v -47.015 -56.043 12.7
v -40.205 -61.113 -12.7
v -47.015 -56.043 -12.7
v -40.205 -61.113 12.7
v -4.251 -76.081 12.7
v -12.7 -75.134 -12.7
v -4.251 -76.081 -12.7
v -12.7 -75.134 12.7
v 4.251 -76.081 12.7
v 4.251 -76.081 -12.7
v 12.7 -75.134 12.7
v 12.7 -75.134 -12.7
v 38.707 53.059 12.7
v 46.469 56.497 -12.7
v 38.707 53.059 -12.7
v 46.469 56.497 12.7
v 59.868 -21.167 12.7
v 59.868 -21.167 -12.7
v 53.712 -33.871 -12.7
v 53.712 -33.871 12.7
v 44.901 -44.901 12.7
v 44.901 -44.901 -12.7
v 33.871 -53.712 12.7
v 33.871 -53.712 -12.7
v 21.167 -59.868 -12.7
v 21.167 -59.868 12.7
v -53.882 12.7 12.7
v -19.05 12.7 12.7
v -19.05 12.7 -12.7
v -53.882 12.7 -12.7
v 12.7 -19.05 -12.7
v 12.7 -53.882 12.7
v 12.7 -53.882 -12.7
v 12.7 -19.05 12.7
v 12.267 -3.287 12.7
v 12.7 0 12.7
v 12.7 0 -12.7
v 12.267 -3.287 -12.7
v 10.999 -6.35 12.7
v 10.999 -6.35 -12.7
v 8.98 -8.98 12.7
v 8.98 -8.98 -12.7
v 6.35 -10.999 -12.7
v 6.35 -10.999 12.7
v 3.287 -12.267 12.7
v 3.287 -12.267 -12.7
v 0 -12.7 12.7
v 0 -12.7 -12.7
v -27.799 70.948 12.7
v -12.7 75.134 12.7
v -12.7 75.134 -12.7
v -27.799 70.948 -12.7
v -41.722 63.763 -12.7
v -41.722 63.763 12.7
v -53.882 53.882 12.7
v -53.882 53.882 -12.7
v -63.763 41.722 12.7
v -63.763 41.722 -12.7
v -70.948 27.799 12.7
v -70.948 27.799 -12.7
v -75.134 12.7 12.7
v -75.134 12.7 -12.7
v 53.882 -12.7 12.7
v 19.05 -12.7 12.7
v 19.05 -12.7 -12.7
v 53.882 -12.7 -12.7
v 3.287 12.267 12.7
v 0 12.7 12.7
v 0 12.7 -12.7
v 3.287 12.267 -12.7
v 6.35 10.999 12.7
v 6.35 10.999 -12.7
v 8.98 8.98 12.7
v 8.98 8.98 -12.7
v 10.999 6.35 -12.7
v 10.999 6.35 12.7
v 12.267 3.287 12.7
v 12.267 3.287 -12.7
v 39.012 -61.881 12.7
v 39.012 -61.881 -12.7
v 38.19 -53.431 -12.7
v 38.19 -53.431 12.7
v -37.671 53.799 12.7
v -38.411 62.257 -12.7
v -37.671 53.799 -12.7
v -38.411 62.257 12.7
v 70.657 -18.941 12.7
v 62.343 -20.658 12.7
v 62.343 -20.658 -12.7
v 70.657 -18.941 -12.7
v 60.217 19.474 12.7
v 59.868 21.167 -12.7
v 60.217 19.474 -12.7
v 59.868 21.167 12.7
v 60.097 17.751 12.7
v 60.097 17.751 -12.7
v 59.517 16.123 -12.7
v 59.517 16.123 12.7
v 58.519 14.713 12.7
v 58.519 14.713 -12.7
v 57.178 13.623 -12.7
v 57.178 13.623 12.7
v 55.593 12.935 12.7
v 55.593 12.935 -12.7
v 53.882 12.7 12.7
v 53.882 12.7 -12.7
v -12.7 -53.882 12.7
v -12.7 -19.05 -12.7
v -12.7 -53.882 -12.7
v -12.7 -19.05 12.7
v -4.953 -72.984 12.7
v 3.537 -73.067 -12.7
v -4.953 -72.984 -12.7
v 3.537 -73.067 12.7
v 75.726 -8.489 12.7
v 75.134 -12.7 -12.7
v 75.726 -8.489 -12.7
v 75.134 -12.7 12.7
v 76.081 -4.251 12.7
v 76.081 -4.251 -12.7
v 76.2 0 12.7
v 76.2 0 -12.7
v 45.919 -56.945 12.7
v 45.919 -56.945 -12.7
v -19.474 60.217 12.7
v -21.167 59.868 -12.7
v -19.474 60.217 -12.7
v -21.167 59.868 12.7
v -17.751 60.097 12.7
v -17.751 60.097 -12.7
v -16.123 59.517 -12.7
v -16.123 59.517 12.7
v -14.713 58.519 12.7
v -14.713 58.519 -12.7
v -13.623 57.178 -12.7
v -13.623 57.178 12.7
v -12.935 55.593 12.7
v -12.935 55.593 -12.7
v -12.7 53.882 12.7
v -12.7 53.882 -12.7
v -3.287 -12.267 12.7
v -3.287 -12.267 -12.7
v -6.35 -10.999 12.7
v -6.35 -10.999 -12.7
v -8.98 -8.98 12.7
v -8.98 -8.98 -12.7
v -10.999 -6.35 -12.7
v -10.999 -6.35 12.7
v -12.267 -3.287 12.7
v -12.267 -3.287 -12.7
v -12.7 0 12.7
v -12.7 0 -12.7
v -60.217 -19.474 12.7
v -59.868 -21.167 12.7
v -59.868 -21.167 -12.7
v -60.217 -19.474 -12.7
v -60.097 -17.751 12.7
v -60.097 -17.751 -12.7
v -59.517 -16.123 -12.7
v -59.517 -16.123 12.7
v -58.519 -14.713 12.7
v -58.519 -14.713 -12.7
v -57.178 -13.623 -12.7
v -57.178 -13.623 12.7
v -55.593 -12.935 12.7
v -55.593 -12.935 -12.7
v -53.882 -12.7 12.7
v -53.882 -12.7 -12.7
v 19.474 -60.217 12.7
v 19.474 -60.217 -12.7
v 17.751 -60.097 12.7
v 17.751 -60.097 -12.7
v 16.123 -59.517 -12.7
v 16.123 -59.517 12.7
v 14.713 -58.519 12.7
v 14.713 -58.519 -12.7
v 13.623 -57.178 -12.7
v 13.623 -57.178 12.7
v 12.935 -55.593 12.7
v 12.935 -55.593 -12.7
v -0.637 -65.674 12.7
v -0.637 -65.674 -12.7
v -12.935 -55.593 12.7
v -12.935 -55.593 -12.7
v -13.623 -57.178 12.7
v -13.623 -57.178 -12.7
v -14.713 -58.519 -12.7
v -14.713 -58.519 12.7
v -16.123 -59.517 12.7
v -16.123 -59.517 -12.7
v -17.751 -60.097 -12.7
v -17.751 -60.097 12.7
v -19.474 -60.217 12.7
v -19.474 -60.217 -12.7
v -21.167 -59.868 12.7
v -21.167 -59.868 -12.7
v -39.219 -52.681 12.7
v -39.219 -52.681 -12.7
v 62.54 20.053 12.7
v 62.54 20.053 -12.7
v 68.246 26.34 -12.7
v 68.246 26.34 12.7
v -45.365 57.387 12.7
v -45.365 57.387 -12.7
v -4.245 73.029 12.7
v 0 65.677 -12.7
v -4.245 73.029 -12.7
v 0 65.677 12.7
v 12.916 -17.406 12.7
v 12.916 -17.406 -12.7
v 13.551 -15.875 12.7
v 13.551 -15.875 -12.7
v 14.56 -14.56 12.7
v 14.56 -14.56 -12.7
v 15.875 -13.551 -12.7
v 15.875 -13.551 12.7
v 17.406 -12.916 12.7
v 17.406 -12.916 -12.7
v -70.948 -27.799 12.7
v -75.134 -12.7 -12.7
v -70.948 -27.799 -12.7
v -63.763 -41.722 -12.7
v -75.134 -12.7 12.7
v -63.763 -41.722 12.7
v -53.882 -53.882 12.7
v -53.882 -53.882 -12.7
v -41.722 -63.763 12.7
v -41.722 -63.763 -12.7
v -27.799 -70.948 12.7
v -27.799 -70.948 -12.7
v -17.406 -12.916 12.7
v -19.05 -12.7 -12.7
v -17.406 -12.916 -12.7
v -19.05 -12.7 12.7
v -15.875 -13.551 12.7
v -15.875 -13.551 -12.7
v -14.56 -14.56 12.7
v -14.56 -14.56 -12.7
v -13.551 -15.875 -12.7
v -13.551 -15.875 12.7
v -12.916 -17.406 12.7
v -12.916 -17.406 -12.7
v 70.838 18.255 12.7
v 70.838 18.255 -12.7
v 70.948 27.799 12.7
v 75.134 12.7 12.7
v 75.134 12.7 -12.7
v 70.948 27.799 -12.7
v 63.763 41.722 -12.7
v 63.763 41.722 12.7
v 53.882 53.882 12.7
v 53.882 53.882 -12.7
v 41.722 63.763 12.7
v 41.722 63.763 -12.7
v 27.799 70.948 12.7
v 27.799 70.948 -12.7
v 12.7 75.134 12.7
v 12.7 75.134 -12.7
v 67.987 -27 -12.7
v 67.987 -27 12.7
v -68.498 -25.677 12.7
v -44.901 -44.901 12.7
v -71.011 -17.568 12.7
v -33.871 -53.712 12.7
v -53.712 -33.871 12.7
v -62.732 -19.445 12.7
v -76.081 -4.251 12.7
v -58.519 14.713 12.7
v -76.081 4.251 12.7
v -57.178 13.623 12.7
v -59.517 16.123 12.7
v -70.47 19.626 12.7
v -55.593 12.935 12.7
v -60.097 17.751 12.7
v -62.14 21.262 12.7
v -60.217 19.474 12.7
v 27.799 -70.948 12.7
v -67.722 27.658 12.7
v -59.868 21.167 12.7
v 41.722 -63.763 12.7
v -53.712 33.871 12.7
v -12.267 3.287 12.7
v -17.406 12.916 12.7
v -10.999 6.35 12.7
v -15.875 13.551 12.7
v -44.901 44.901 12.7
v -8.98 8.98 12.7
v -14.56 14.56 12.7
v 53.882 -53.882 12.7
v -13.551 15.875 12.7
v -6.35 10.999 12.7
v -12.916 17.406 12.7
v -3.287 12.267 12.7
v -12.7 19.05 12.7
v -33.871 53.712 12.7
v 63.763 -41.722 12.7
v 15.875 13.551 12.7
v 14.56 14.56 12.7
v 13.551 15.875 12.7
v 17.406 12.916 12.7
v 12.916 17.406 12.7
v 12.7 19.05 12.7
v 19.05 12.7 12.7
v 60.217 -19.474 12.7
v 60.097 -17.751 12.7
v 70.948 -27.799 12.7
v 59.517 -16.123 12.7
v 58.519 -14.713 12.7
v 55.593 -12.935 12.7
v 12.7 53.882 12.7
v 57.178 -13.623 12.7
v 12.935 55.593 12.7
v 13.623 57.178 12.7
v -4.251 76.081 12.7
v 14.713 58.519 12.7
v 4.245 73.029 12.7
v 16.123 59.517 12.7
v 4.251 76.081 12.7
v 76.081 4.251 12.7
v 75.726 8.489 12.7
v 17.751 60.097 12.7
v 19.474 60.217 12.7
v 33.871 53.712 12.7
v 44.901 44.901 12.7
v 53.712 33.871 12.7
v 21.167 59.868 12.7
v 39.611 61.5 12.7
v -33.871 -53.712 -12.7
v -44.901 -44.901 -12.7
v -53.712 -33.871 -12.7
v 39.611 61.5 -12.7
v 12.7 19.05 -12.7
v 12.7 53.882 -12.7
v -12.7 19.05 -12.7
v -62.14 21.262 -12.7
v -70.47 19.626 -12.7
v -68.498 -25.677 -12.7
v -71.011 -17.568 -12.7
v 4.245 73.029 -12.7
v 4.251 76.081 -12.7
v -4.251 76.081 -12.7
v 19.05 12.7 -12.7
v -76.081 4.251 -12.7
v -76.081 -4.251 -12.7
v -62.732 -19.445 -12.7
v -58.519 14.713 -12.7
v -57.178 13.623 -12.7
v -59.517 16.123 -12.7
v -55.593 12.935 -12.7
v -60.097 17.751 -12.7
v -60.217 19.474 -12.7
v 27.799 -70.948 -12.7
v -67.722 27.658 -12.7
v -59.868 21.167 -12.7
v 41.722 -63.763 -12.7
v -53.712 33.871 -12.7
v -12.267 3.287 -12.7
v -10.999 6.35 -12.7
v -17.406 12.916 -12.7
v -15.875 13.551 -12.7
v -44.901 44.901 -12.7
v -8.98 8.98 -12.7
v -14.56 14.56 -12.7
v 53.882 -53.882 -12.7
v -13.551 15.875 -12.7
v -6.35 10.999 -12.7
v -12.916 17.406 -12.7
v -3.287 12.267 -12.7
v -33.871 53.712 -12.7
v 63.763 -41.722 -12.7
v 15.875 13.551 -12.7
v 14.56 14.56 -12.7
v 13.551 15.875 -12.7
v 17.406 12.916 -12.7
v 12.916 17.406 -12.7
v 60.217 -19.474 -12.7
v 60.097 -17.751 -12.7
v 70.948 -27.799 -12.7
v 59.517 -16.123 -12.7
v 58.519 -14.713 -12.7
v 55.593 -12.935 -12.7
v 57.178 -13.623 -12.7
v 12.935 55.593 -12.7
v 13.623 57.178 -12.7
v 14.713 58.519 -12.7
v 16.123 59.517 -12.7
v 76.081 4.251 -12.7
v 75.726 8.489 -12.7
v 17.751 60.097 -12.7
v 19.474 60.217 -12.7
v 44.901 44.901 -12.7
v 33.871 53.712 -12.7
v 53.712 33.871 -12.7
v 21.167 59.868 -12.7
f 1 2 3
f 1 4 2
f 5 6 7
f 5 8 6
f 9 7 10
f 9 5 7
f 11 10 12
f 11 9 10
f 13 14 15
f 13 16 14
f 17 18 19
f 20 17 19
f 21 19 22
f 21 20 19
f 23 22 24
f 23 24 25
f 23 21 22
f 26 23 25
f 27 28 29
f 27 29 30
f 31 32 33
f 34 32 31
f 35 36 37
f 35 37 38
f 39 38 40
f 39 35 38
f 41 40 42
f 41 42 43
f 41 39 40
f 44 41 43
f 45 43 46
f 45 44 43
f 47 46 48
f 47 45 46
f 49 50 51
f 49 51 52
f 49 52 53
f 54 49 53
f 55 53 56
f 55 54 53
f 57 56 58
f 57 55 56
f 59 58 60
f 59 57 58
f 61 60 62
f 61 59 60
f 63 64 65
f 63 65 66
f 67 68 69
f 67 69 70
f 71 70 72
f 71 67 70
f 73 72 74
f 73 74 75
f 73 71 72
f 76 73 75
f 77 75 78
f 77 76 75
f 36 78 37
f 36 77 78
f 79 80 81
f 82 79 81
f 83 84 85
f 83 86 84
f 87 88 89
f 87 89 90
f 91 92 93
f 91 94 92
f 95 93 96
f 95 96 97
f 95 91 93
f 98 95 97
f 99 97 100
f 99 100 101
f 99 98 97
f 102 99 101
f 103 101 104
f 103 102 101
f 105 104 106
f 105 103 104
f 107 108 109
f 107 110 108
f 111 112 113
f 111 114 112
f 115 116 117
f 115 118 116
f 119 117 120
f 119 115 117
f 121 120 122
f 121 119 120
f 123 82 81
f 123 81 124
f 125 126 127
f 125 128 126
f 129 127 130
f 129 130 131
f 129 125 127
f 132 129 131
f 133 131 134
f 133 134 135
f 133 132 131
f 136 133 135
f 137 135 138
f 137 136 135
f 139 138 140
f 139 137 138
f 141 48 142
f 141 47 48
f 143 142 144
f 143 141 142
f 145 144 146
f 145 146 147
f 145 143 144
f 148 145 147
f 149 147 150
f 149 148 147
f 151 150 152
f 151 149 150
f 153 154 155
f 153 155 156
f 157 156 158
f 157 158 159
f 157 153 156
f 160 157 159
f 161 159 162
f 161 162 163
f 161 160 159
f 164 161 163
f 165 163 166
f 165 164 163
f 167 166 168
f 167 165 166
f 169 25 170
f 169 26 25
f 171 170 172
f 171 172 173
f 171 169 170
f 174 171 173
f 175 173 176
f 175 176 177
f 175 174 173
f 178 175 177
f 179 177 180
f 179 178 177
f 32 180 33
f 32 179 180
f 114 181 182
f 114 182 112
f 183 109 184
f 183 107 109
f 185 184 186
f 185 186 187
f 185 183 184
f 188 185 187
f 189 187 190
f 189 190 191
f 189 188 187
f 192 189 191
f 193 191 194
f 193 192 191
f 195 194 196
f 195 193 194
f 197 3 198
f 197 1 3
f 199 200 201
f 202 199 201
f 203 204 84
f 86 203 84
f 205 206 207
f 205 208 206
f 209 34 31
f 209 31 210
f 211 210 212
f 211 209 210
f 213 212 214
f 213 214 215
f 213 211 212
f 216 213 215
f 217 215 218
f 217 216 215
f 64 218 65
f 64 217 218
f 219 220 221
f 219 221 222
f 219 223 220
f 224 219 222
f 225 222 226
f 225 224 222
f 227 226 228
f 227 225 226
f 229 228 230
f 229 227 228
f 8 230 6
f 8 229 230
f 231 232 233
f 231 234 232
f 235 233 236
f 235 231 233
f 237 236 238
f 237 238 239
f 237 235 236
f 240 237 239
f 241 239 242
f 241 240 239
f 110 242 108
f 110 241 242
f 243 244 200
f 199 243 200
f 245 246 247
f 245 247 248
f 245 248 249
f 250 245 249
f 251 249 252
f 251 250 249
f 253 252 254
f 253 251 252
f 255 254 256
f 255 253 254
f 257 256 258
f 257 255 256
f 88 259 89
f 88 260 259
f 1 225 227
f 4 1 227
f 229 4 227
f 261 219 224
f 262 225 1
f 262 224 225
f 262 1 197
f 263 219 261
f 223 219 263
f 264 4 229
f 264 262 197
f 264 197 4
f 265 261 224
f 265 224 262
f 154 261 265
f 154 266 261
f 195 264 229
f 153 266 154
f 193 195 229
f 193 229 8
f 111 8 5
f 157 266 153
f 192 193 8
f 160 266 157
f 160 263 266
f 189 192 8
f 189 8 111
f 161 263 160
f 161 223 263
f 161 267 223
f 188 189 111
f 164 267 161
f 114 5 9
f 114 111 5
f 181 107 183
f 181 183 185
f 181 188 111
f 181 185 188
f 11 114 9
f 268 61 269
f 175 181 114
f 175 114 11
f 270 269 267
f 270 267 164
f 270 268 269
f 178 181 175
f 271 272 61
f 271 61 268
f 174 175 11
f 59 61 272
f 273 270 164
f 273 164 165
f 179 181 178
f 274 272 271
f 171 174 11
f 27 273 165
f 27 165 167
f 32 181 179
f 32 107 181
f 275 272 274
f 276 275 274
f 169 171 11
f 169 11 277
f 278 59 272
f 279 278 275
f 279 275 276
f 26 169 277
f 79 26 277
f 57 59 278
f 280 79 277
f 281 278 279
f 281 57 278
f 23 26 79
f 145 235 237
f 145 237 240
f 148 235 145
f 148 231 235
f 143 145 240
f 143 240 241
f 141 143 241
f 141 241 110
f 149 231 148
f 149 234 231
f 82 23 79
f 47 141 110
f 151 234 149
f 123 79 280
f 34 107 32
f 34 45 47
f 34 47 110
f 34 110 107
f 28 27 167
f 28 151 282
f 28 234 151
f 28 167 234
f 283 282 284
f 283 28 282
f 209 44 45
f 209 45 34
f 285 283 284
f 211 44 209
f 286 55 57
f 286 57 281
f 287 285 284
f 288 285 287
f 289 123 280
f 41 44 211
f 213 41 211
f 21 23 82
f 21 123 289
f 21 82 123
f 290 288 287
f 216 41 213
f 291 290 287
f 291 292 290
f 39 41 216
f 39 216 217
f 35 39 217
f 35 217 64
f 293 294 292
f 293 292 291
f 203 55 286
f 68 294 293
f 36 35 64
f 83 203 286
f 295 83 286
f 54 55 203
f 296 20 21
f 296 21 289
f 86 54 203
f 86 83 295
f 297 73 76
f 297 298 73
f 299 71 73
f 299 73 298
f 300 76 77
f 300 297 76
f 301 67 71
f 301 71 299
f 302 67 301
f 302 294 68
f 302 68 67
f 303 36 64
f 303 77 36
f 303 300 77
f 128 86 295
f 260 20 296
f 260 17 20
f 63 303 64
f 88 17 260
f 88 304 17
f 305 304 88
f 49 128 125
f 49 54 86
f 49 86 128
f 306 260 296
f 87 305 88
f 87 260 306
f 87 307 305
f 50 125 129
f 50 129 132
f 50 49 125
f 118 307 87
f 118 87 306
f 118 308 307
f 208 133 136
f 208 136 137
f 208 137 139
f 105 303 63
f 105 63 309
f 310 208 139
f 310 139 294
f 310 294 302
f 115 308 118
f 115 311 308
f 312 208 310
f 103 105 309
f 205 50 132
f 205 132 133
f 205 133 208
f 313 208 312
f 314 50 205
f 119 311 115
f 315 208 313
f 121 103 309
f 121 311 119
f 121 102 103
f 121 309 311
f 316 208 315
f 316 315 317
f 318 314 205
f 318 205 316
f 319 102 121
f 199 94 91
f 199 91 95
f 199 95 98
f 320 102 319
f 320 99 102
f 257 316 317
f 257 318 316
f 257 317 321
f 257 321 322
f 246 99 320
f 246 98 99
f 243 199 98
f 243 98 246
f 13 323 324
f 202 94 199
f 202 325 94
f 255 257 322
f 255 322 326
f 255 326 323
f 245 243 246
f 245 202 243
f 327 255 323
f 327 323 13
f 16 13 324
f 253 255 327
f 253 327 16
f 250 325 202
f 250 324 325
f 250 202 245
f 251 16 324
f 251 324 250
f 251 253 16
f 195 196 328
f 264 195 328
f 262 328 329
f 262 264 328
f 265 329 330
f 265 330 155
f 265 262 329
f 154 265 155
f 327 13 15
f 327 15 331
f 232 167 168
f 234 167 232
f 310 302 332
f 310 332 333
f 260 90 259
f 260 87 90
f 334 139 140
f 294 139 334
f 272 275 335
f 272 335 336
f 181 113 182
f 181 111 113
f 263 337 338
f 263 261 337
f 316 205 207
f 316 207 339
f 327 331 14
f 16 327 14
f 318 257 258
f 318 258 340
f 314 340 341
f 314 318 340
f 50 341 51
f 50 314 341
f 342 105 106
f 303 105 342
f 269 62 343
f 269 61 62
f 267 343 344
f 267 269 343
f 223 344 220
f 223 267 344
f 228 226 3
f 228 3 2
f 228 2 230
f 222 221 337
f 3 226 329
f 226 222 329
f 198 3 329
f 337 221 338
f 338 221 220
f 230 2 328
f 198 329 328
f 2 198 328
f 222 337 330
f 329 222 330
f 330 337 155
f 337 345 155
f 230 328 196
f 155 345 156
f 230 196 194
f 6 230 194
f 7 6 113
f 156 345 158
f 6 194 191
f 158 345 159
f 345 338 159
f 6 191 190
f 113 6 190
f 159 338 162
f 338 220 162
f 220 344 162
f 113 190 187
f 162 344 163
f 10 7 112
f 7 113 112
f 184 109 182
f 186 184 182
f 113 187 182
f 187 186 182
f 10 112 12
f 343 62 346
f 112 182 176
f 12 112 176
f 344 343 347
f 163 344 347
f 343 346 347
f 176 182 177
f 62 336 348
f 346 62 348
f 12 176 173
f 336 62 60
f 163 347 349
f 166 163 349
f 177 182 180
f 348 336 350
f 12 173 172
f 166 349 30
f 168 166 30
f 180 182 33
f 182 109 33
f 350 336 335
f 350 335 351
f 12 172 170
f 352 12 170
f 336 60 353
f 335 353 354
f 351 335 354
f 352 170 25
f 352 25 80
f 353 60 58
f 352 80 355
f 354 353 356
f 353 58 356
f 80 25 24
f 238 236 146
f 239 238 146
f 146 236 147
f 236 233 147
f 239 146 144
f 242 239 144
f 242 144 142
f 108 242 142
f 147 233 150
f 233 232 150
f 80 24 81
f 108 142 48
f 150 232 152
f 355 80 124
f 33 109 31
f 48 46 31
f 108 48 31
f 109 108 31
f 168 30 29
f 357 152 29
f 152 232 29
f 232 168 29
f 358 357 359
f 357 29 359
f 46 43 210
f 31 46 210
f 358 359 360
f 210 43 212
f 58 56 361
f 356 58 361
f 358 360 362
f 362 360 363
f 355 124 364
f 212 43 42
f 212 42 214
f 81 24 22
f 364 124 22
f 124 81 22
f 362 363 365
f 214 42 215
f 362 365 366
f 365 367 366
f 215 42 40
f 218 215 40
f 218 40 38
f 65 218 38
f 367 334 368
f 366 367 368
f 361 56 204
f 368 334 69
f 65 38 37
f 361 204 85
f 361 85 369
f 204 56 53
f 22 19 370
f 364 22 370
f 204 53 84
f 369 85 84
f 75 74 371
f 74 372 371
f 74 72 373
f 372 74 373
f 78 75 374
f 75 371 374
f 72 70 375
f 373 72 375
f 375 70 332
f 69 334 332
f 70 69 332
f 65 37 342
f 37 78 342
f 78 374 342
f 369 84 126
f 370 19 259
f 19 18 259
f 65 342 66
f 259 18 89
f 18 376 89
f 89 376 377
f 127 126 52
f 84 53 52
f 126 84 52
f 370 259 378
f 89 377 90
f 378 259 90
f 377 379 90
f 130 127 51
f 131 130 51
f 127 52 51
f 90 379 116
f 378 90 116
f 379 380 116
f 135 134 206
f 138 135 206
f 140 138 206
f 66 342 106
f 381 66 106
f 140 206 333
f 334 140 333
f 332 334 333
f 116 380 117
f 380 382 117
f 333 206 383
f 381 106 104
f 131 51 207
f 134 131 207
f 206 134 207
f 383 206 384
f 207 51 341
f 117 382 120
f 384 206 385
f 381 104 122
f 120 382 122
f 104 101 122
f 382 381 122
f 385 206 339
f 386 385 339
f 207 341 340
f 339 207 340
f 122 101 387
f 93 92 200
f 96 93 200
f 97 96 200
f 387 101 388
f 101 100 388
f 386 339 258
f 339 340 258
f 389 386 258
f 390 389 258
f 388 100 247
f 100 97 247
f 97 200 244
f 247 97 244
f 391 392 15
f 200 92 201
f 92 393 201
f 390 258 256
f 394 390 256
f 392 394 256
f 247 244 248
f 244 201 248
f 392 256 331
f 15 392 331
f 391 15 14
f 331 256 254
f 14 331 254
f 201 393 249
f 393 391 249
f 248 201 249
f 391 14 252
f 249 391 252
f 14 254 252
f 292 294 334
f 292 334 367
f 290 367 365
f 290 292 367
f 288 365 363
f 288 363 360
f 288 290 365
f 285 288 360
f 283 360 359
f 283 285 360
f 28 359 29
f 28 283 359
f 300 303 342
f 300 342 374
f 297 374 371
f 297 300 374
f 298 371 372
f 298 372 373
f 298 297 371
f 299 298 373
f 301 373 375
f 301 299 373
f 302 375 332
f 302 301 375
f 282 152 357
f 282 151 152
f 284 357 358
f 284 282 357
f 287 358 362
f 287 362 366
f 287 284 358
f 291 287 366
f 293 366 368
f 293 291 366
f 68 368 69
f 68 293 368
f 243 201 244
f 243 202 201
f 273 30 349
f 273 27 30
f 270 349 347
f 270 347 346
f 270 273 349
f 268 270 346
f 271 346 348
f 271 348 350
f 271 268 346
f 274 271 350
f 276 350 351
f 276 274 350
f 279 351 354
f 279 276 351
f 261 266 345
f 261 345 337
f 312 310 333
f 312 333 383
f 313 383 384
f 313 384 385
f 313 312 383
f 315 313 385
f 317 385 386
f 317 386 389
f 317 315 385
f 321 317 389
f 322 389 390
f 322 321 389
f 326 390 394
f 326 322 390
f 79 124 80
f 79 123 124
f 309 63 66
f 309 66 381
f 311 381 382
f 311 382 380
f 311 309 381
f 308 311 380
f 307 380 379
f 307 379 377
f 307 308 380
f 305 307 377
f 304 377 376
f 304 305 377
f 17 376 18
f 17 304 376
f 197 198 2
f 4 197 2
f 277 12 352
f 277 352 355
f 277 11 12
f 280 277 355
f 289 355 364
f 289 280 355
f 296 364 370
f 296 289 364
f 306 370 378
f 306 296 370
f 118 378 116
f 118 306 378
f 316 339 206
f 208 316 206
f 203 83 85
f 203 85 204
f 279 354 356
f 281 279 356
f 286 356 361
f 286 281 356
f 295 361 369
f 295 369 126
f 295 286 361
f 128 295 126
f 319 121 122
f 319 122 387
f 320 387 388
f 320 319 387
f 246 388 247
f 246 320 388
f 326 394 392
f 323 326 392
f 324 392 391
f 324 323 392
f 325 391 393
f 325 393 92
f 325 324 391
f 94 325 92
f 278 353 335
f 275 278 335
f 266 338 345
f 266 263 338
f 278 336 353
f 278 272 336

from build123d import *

# Parameters (mm, degrees)
F1_DEPTH = 12.7


with BuildPart() as f1:
    # F0 (on Top) → F1 (new body, symmetric)
    with BuildSketch(Plane.XY):
        with BuildLine():
            ThreePointArc((75.134213, -12.7), (75.933086, -6.372321), (76.2, 0))
            ThreePointArc((76.2, 0), (75.933086, 6.372321), (75.134213, 12.7))
            ThreePointArc((75.134213, 12.7), (53.881537, 53.881537), (12.7, 75.134213))
            ThreePointArc((12.7, 75.134213), (0, 76.2), (-12.7, 75.134213))
            ThreePointArc((-12.7, 75.134213), (-53.881537, 53.881537), (-75.134213, 12.7))
            ThreePointArc((-75.134213, 12.7), (-76.2, 0), (-75.134213, -12.7))
            ThreePointArc((-75.134213, -12.7), (-53.881537, -53.881537), (-12.7, -75.134213))
            ThreePointArc((-12.7, -75.134213), (0, -76.2), (12.7, -75.134213))
            ThreePointArc((12.7, -75.134213), (53.881537, -53.881537), (75.134213, -12.7))
        make_face()
        Polygon((-39.219381, -52.680772), (-40.204984, -61.113142), (-47.01483, -56.0434), align=None, mode=Mode.SUBTRACT)
        Polygon((-0.636809, -65.673572), (3.53659, -73.066746), (-4.952786, -72.984428), align=None, mode=Mode.SUBTRACT)
        Polygon((-62.731954, -19.445449), (-68.497842, -25.676887), (-71.011482, -17.567763), align=None, mode=Mode.SUBTRACT)
        with BuildLine():
            ThreePointArc((-21.166667, -59.868374), (-44.901281, -44.901281), (-59.868374, -21.166667))
            ThreePointArc((-59.868374, -21.166667), (-59.06629, -15.383826), (-53.881537, -12.7))
            Line((-53.881537, -12.7), (-19.05, -12.7))
            ThreePointArc((-19.05, -12.7), (-14.559872, -14.559872), (-12.7, -19.05))
            Line((-12.7, -19.05), (-12.7, -53.881537))
            ThreePointArc((-12.7, -53.881537), (-15.383826, -59.06629), (-21.166667, -59.868374))
        make_face(mode=Mode.SUBTRACT)
        Polygon((38.190457, -53.431382), (45.919233, -56.944542), (39.012359, -61.881279), align=None, mode=Mode.SUBTRACT)
        with BuildLine():
            ThreePointArc((12.7, -19.05), (14.559872, -14.559872), (19.05, -12.7))
            Line((19.05, -12.7), (53.881537, -12.7))
            ThreePointArc((53.881537, -12.7), (59.06629, -15.383826), (59.868374, -21.166667))
            ThreePointArc((59.868374, -21.166667), (44.901281, -44.901281), (21.166667, -59.868374))
            ThreePointArc((21.166667, -59.868374), (15.383826, -59.06629), (12.7, -53.881537))
            Line((12.7, -53.881537), (12.7, -19.05))
        make_face(mode=Mode.SUBTRACT)
        Polygon((62.343086, -20.658249), (70.657467, -18.941467), (67.987053, -27.000324), align=None, mode=Mode.SUBTRACT)
        Polygon((-62.13985, 21.261764), (-70.470487, 19.62568), (-67.722059, 27.658265), align=None, mode=Mode.SUBTRACT)
        with BuildLine():
            Line((-12.7, 53.881537), (-12.7, 19.05))
            ThreePointArc((-12.7, 19.05), (-14.559872, 14.559872), (-19.05, 12.7))
            Line((-19.05, 12.7), (-53.881537, 12.7))
            ThreePointArc((-53.881537, 12.7), (-59.06629, 15.383826), (-59.868374, 21.166667))
            ThreePointArc((-59.868374, 21.166667), (-44.901281, 44.901281), (-21.166667, 59.868374))
            ThreePointArc((-21.166667, 59.868374), (-15.383826, 59.06629), (-12.7, 53.881537))
        make_face(mode=Mode.SUBTRACT)
        Polygon((-37.670584, 53.79917), (-45.364933, 57.387104), (-38.410517, 62.256639), align=None, mode=Mode.SUBTRACT)
        with BuildLine():
            ThreePointArc((0, 12.7), (8.980256, 8.980256), (12.7, 0))
            ThreePointArc((12.7, 0), (8.980256, -8.980256), (0, -12.7))
            ThreePointArc((0, -12.7), (-8.980256, -8.980256), (-12.7, 0))
            ThreePointArc((-12.7, 0), (-8.980256, 8.980256), (0, 12.7))
        make_face(mode=Mode.SUBTRACT)
        with BuildLine():
            ThreePointArc((19.05, 12.7), (14.559872, 14.559872), (12.7, 19.05))
            Line((12.7, 19.05), (12.7, 53.881537))
            ThreePointArc((12.7, 53.881537), (15.383826, 59.06629), (21.166667, 59.868374))
            ThreePointArc((21.166667, 59.868374), (44.901281, 44.901281), (59.868374, 21.166667))
            ThreePointArc((59.868374, 21.166667), (59.06629, 15.383826), (53.881537, 12.7))
            Line((53.881537, 12.7), (19.05, 12.7))
        make_face(mode=Mode.SUBTRACT)
        Polygon((62.54046, 20.052792), (68.245656, 26.339844), (70.837805, 18.255473), align=None, mode=Mode.SUBTRACT)
        Polygon((-4.244888, 73.02902), (4.244888, 73.02902), (0, 65.676659), align=None, mode=Mode.SUBTRACT)
        Polygon((38.706739, 53.058571), (39.610534, 61.500102), (46.469216, 56.496627), align=None, mode=Mode.SUBTRACT)
    extrude(amount=F1_DEPTH, both=True)


solid = f1.part
